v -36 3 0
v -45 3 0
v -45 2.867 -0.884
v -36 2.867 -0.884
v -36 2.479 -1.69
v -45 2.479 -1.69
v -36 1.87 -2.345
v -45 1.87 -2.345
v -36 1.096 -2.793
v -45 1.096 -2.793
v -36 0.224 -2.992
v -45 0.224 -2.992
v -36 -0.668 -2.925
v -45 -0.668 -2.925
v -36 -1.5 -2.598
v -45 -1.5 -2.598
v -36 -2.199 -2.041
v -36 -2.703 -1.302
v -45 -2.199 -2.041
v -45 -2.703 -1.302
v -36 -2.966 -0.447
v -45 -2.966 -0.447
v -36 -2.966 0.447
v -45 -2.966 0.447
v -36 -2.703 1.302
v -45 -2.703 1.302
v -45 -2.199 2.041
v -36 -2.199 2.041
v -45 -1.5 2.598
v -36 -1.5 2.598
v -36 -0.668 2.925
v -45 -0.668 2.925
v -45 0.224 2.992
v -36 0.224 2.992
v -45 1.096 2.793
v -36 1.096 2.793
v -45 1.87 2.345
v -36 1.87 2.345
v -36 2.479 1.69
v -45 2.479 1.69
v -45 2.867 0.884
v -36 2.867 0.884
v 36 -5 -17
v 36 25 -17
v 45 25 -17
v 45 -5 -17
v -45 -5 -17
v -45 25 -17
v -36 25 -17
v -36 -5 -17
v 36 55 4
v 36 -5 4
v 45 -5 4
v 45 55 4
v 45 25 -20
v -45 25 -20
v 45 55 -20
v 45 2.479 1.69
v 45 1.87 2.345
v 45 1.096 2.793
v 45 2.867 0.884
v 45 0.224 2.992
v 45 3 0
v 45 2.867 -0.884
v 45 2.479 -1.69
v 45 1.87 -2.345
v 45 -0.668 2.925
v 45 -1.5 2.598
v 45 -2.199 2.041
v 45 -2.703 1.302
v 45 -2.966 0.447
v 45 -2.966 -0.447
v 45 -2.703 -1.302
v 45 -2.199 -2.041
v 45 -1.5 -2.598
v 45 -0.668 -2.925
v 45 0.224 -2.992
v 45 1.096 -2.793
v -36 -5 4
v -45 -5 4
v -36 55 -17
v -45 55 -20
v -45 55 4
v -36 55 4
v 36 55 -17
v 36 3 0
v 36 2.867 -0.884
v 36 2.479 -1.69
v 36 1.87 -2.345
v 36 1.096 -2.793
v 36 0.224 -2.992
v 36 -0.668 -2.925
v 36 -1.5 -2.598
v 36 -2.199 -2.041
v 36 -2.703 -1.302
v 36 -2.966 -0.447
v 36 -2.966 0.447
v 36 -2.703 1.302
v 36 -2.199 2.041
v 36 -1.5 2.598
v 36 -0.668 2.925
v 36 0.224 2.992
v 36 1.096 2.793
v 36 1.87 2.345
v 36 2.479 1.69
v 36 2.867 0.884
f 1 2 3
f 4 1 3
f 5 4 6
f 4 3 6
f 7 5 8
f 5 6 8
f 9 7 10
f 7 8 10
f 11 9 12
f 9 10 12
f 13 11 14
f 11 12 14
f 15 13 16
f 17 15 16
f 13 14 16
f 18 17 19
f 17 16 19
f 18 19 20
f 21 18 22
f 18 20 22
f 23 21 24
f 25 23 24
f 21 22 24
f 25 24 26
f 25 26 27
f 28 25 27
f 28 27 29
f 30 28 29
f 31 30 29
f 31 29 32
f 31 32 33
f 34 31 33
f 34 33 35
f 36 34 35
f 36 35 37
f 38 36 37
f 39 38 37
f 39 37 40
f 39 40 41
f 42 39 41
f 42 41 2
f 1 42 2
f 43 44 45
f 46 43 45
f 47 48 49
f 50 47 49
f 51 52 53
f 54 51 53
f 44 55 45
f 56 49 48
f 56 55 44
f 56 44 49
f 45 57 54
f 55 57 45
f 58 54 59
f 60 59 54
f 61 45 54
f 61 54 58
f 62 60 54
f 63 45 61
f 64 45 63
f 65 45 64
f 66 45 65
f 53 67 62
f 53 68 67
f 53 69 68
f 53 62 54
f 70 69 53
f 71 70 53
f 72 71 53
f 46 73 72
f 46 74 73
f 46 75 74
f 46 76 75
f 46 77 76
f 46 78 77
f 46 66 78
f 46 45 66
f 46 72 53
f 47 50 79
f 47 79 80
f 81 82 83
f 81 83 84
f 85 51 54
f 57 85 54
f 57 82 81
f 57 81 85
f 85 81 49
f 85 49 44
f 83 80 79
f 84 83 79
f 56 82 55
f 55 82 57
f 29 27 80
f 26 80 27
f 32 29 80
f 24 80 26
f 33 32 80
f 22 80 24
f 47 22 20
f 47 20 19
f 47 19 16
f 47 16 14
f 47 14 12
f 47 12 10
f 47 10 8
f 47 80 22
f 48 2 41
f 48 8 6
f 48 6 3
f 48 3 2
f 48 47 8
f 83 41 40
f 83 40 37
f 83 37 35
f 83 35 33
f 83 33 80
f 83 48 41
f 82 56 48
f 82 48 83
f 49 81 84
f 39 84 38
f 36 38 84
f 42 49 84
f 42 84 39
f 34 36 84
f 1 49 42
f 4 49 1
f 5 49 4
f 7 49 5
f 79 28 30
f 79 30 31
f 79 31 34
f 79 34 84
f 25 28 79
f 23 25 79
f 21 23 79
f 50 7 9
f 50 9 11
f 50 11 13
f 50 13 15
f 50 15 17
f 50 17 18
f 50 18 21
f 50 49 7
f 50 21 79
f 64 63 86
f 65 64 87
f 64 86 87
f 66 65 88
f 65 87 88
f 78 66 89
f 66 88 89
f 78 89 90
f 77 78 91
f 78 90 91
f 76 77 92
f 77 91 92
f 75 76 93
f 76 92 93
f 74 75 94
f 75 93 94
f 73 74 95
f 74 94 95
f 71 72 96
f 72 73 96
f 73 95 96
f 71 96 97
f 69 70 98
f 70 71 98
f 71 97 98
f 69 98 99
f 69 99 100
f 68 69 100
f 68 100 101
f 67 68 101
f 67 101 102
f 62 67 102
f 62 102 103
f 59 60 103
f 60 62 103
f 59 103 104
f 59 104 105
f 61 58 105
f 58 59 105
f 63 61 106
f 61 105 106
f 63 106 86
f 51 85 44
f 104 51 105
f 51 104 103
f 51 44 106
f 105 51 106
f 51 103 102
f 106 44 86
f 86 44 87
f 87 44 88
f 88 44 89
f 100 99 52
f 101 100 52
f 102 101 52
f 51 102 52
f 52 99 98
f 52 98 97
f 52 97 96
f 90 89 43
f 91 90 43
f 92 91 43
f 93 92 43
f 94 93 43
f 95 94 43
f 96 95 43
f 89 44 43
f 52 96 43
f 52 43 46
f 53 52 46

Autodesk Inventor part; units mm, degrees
ref_plane "YZ Plane" through (0, 0, 0) normal (1, 0, 0) x (0, 1, 0)
ref_plane "XZ Plane" through (0, 0, 0) normal (0, 1, 0) x (-1, 0, 0)
ref_plane "作業平面1" through (0, 0, -20) normal (0, 0, 1) x (1, 0, 0)
sketch "スケッチ1" plane through (0, 0, -20) normal (0, 0, 1) x (1, 0, 0)
  line L0 (-45, 55) -> (45, 55)
  line L1 (45, 55) -> (45, 25)
  line L2 (45, 25) -> (-45, 25)
  line L3 (-45, 25) -> (-45, 55)
  line L4 (0, 66) -> (0, -11) projected
  line L5 (-63, 0) -> (63, 0) projected
  point P0 (0, 0)
  dimension "d1" = 90
  dimension "d2" = 30
  dimension "d3" = 55
extrude "押し出し1" add sketch "スケッチ1" along normal blind 3
sketch "スケッチ2" plane through (0, 0, -17) normal (0, 0, 1) x (1, 0, 0)
  line L0 (45, 55) -> (-45, 55) projected
  line L1 (45, 55) -> (36, 55)
  line L2 (36, 55) -> (36, -5)
  line L3 (36, -5) -> (45, -5)
  line L4 (45, -5) -> (45, 55)
  line L5 (-45, 55) -> (-45, 25) projected
  line L6 (-45, 55) -> (-36, 55)
  line L7 (-36, 55) -> (-36, -5)
  line L8 (-36, -5) -> (-45, -5)
  line L9 (-45, -5) -> (-45, 55)
  point P0 (0, 0)
  dimension "d6" = 9
  dimension "d7" = 60
  dimension "d8" = 9
extrude "押し出し2" add sketch "スケッチ2" along normal blind 21
sketch "スケッチ3" plane through (0, 0, 0) normal (1, 0, 0) x (0, 1, 0)
  circle A0 centre (0, 0) radius 3
  dimension "d11" = 6
extrude "押し出し3" cut sketch "スケッチ3" along normal up to surface (90 mm away) from surface at -45
properties part number "vacuum_cup_base"
